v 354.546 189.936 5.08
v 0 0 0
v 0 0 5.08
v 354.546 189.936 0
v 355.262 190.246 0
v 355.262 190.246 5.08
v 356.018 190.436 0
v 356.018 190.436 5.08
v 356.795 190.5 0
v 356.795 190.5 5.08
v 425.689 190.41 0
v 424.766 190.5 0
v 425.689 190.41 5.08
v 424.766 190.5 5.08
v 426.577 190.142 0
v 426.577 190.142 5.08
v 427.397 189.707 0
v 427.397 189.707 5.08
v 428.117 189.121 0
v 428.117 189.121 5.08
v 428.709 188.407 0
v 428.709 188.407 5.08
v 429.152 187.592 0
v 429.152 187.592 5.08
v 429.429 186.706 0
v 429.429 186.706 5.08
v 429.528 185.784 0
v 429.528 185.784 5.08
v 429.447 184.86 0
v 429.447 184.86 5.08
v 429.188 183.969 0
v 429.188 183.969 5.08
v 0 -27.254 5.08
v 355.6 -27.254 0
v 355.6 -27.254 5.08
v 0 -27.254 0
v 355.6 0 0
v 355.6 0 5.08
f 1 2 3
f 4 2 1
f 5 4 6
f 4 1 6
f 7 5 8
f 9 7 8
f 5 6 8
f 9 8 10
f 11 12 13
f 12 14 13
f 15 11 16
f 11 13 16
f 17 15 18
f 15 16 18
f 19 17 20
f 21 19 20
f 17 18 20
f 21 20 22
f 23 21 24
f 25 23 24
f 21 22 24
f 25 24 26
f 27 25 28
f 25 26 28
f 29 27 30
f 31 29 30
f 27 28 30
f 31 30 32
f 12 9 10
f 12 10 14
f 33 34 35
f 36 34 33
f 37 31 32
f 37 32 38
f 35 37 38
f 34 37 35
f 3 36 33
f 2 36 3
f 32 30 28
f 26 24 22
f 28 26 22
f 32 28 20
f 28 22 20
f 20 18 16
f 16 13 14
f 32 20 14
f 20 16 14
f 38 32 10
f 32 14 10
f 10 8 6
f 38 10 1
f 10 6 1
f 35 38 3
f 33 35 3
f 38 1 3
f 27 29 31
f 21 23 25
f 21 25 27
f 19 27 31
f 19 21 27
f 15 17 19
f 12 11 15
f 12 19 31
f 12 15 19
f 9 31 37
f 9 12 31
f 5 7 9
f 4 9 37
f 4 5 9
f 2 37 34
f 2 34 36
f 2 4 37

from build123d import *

# Parameters (mm, degrees)
FIN_BODY_DEPTH = 5.08
FIN_FILLETS_R  = 4.7625


with BuildPart() as part:
    # Fin Profile → Fin Body (new body)
    with BuildSketch(Plane.XY):
        Polygon((355.6, -27.2542), (0, -27.2542), (0, 0), (355.6, 190.5), (431.8, 190.5), (355.6, 0), align=None)
    extrude(amount=FIN_BODY_DEPTH)

    # Fin Fillets
    fin_fillets_edges = [part.edges().sort_by_distance(p)[0] for p in [
        (431.8, 190.5, 2.54),
        (355.6, 190.5, 2.54),
    ]]
    fillet(fin_fillets_edges, radius=FIN_FILLETS_R)


solid = part.part
